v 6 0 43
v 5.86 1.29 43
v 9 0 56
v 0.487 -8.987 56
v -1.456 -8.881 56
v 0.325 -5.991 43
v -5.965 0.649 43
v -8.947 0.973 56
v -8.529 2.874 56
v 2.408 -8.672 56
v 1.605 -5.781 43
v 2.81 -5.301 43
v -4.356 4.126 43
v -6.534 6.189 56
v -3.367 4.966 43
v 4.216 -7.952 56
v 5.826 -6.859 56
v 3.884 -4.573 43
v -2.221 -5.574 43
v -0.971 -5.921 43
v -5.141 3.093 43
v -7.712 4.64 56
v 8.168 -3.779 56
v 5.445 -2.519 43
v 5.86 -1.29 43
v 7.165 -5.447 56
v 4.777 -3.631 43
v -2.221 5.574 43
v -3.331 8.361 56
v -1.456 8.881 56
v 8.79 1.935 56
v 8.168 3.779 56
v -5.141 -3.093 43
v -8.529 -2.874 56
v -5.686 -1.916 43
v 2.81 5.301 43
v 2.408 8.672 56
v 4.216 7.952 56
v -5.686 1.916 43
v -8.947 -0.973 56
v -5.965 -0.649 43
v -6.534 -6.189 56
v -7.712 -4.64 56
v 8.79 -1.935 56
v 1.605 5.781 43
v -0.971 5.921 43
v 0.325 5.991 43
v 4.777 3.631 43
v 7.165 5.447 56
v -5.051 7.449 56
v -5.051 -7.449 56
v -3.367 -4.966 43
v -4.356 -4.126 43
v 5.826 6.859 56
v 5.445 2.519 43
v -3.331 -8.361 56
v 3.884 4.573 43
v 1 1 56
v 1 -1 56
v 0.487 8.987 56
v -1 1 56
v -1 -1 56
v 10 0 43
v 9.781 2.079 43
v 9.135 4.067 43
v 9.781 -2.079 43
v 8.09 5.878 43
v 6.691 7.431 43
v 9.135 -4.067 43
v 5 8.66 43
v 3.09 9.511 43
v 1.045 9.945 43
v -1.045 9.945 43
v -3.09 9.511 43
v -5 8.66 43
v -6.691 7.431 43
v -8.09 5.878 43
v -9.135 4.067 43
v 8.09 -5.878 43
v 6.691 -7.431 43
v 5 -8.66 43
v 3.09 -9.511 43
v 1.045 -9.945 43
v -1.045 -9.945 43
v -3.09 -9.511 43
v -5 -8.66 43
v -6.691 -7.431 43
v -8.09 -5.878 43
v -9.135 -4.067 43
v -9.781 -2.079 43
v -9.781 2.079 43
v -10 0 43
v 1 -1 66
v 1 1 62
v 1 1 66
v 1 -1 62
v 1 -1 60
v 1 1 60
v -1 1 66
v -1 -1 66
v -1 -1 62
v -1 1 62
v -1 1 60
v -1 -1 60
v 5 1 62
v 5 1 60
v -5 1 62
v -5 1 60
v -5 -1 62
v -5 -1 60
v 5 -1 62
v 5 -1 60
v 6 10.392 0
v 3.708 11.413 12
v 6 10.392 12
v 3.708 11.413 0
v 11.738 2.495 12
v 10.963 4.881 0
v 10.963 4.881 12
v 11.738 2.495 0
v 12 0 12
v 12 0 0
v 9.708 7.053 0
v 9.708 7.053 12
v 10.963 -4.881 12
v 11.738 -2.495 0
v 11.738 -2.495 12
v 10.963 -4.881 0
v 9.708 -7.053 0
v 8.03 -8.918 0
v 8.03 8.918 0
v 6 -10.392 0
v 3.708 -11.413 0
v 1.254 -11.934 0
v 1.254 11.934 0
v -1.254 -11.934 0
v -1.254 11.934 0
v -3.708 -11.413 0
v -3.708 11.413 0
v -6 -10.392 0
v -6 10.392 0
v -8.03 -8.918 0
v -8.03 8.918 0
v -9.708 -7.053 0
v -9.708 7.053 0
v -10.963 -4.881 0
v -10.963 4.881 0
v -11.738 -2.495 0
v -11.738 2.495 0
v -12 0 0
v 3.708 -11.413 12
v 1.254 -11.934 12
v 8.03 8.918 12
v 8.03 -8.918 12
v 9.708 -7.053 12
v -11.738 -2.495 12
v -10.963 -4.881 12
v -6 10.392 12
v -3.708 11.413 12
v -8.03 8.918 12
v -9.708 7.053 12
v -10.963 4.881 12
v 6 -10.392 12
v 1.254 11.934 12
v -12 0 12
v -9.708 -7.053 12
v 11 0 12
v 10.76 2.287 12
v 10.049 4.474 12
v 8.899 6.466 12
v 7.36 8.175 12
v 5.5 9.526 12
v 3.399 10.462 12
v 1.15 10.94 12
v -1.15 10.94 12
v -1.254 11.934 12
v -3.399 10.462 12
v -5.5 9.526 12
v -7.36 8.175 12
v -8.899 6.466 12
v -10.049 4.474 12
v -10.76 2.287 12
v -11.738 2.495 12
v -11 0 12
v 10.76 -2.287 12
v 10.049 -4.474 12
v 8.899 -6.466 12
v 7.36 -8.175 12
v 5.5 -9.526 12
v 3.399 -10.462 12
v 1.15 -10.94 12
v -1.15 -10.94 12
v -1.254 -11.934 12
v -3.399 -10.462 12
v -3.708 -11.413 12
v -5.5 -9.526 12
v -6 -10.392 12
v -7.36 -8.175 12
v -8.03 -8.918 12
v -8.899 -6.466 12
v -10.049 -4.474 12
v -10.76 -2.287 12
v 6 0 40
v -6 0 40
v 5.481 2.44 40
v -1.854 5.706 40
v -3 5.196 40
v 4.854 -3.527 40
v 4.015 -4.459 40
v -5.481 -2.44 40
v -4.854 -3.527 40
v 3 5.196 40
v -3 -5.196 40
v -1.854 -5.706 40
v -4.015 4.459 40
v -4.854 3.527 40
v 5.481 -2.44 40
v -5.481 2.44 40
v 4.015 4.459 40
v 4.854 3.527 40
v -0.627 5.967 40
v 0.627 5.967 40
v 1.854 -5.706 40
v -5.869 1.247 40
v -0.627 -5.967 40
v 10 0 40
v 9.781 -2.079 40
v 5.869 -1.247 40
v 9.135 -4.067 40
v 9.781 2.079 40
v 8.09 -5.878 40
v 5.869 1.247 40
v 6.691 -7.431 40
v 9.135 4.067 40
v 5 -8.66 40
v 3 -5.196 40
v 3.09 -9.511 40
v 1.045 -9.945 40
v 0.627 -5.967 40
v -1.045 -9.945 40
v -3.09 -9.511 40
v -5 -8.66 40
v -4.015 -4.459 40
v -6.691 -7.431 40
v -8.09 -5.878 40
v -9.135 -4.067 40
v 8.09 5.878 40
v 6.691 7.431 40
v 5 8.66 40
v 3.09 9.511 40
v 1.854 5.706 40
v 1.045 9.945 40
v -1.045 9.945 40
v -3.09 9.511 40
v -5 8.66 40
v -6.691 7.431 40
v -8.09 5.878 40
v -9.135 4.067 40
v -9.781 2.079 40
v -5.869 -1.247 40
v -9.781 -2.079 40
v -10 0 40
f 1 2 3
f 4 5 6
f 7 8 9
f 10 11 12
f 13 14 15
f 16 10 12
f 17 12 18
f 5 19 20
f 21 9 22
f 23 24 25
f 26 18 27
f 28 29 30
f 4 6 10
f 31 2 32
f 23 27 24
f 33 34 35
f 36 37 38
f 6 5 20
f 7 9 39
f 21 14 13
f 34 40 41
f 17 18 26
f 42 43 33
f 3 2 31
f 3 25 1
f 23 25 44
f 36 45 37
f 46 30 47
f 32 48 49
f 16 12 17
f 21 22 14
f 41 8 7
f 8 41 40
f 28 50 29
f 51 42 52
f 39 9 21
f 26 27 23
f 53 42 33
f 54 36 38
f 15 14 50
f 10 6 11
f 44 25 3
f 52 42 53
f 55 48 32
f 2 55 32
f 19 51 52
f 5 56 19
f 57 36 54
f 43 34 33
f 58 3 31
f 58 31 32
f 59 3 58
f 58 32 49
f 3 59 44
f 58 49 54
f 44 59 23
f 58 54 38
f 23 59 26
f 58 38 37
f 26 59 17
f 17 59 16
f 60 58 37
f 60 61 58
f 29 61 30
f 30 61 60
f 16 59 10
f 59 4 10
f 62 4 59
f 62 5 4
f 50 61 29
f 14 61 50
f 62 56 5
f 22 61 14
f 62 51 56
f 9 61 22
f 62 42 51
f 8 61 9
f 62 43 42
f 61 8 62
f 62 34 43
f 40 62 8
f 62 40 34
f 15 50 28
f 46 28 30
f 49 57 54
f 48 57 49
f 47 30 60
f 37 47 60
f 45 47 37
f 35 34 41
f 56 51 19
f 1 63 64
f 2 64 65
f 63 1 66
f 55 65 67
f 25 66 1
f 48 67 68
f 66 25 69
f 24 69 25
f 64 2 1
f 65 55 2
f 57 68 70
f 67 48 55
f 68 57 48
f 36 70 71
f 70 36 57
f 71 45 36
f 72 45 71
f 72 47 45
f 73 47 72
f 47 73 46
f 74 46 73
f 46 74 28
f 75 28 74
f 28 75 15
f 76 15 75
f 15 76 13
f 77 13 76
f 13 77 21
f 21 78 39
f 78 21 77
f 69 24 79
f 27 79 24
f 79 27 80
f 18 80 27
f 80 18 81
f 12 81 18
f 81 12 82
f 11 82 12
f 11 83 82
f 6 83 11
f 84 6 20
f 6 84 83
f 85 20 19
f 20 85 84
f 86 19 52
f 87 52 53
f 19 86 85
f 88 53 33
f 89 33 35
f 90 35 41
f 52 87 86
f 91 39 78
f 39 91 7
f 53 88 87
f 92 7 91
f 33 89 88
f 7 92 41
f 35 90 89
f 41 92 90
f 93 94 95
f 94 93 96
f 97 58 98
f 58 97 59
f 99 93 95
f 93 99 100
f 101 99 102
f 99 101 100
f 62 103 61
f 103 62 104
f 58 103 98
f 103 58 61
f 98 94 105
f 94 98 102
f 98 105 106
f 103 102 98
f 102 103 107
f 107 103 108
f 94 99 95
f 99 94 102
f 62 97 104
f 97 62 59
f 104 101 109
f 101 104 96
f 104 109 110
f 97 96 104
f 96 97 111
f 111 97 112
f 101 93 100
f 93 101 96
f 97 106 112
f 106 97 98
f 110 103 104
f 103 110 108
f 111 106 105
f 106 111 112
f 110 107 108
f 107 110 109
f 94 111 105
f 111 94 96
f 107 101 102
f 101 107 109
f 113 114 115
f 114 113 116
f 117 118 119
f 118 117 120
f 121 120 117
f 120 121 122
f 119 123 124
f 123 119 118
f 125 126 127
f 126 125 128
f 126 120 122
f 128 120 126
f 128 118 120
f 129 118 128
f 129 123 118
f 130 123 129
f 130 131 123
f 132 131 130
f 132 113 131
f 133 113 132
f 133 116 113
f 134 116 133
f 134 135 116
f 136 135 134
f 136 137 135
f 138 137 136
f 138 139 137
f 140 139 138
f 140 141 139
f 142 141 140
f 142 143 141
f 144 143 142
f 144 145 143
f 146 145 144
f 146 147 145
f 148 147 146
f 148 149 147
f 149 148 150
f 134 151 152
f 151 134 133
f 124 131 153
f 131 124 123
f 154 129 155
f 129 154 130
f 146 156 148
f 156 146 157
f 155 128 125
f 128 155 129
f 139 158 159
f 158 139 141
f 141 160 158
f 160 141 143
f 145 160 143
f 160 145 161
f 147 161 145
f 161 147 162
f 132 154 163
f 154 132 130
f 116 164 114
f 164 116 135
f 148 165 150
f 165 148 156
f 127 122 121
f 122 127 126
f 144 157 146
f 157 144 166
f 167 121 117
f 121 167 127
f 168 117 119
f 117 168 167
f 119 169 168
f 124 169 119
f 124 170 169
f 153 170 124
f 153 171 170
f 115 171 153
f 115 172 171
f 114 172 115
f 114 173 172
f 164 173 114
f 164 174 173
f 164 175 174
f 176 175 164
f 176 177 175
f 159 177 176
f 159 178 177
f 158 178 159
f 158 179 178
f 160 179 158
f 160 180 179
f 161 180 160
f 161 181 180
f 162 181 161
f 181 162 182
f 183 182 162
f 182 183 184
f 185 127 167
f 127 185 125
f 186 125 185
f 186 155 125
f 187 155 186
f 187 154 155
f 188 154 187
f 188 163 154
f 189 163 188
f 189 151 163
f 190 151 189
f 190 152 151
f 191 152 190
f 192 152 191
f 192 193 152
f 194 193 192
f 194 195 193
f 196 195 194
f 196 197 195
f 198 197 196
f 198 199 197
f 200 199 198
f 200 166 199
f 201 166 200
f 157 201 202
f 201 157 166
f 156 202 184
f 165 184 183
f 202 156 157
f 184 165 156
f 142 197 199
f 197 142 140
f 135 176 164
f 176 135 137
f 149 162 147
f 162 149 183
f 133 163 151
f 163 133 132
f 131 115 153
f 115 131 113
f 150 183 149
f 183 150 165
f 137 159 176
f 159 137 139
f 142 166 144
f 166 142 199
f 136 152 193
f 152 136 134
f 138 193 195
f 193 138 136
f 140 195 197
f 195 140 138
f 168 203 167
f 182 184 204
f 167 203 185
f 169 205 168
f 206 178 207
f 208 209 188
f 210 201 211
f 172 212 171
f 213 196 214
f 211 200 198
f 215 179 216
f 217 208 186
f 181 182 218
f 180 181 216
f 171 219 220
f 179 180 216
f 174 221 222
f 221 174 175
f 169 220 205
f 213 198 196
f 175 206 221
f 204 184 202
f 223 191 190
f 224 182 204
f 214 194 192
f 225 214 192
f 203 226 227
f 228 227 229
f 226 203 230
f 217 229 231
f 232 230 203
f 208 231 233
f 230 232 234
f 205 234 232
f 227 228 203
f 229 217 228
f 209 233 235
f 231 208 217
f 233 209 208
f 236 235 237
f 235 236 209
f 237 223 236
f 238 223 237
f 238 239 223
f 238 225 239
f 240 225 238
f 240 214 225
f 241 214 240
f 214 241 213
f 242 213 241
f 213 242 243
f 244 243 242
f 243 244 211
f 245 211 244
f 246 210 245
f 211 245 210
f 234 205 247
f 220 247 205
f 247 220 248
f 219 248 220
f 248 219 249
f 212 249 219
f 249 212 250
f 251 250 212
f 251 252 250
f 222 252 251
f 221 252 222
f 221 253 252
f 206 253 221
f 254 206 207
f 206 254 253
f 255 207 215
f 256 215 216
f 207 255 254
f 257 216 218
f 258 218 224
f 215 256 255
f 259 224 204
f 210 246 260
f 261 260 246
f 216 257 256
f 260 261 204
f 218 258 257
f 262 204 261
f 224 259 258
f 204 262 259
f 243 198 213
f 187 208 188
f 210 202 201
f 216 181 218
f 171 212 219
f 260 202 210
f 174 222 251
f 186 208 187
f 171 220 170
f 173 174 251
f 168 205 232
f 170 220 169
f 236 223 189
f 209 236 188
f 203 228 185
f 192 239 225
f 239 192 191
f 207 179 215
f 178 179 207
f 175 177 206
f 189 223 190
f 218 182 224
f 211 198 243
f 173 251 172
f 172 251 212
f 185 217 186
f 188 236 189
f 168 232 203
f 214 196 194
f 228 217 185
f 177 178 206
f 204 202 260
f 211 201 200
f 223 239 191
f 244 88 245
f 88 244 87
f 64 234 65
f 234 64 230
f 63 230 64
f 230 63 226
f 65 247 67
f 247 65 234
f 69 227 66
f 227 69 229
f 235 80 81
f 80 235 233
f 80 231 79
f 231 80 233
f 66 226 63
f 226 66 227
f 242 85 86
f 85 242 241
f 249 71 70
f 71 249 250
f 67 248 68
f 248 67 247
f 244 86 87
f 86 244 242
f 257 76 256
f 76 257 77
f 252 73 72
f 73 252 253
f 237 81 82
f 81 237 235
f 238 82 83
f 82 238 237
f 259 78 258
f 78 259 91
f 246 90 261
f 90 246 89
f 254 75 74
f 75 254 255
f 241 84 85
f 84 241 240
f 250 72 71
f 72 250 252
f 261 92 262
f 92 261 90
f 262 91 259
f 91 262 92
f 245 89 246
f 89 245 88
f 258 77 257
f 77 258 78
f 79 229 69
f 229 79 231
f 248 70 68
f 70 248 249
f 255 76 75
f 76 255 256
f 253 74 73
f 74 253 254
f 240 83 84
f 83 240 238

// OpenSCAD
// Generated by SolidPython 1.1.1 on 2021-10-30 23:48:10


union() {
	cylinder(d = 24, h = 12);
	translate(v = [0, 0, 12]) {
		cylinder(d1 = 22, d2 = 12, h = 28);
	}
	translate(v = [0, 0, 40]) {
		cylinder(d = 20, h = 3);
	}
	translate(v = [0, 0, 43]) {
		union() {
			cylinder(d1 = 12, d2 = 18, h = 13);
			translate(v = [0, 0, 18]) {
				cube(center = true, size = [2, 2, 10]);
			}
			translate(v = [0, 0, 18]) {
				rotate(a = [0, 90, 0]) {
					cube(center = true, size = [2, 2, 10]);
				}
			}
		}
	}
}
/***********************************************
*********      SolidPython code:      **********
************************************************
 
from solid import *
from solid.utils import *

#total height 6.6cm

base = cylinder(d=24, h=12)
body = cylinder(d1=22, d2=12, h=28)
colar = cylinder(d=20, h=3)
head = cylinder(d1=12, d2=18, h=13)
head += up(18)(cube([2,2,10], center=True))
head += up(18)(rotate([0,90,0])(cube([2,2,10], center=True)))
king = base + up(12)(body) + up(40)(colar) + up(43)(head)

scad_render_to_file(king, "./king.scad") 
 
************************************************/
